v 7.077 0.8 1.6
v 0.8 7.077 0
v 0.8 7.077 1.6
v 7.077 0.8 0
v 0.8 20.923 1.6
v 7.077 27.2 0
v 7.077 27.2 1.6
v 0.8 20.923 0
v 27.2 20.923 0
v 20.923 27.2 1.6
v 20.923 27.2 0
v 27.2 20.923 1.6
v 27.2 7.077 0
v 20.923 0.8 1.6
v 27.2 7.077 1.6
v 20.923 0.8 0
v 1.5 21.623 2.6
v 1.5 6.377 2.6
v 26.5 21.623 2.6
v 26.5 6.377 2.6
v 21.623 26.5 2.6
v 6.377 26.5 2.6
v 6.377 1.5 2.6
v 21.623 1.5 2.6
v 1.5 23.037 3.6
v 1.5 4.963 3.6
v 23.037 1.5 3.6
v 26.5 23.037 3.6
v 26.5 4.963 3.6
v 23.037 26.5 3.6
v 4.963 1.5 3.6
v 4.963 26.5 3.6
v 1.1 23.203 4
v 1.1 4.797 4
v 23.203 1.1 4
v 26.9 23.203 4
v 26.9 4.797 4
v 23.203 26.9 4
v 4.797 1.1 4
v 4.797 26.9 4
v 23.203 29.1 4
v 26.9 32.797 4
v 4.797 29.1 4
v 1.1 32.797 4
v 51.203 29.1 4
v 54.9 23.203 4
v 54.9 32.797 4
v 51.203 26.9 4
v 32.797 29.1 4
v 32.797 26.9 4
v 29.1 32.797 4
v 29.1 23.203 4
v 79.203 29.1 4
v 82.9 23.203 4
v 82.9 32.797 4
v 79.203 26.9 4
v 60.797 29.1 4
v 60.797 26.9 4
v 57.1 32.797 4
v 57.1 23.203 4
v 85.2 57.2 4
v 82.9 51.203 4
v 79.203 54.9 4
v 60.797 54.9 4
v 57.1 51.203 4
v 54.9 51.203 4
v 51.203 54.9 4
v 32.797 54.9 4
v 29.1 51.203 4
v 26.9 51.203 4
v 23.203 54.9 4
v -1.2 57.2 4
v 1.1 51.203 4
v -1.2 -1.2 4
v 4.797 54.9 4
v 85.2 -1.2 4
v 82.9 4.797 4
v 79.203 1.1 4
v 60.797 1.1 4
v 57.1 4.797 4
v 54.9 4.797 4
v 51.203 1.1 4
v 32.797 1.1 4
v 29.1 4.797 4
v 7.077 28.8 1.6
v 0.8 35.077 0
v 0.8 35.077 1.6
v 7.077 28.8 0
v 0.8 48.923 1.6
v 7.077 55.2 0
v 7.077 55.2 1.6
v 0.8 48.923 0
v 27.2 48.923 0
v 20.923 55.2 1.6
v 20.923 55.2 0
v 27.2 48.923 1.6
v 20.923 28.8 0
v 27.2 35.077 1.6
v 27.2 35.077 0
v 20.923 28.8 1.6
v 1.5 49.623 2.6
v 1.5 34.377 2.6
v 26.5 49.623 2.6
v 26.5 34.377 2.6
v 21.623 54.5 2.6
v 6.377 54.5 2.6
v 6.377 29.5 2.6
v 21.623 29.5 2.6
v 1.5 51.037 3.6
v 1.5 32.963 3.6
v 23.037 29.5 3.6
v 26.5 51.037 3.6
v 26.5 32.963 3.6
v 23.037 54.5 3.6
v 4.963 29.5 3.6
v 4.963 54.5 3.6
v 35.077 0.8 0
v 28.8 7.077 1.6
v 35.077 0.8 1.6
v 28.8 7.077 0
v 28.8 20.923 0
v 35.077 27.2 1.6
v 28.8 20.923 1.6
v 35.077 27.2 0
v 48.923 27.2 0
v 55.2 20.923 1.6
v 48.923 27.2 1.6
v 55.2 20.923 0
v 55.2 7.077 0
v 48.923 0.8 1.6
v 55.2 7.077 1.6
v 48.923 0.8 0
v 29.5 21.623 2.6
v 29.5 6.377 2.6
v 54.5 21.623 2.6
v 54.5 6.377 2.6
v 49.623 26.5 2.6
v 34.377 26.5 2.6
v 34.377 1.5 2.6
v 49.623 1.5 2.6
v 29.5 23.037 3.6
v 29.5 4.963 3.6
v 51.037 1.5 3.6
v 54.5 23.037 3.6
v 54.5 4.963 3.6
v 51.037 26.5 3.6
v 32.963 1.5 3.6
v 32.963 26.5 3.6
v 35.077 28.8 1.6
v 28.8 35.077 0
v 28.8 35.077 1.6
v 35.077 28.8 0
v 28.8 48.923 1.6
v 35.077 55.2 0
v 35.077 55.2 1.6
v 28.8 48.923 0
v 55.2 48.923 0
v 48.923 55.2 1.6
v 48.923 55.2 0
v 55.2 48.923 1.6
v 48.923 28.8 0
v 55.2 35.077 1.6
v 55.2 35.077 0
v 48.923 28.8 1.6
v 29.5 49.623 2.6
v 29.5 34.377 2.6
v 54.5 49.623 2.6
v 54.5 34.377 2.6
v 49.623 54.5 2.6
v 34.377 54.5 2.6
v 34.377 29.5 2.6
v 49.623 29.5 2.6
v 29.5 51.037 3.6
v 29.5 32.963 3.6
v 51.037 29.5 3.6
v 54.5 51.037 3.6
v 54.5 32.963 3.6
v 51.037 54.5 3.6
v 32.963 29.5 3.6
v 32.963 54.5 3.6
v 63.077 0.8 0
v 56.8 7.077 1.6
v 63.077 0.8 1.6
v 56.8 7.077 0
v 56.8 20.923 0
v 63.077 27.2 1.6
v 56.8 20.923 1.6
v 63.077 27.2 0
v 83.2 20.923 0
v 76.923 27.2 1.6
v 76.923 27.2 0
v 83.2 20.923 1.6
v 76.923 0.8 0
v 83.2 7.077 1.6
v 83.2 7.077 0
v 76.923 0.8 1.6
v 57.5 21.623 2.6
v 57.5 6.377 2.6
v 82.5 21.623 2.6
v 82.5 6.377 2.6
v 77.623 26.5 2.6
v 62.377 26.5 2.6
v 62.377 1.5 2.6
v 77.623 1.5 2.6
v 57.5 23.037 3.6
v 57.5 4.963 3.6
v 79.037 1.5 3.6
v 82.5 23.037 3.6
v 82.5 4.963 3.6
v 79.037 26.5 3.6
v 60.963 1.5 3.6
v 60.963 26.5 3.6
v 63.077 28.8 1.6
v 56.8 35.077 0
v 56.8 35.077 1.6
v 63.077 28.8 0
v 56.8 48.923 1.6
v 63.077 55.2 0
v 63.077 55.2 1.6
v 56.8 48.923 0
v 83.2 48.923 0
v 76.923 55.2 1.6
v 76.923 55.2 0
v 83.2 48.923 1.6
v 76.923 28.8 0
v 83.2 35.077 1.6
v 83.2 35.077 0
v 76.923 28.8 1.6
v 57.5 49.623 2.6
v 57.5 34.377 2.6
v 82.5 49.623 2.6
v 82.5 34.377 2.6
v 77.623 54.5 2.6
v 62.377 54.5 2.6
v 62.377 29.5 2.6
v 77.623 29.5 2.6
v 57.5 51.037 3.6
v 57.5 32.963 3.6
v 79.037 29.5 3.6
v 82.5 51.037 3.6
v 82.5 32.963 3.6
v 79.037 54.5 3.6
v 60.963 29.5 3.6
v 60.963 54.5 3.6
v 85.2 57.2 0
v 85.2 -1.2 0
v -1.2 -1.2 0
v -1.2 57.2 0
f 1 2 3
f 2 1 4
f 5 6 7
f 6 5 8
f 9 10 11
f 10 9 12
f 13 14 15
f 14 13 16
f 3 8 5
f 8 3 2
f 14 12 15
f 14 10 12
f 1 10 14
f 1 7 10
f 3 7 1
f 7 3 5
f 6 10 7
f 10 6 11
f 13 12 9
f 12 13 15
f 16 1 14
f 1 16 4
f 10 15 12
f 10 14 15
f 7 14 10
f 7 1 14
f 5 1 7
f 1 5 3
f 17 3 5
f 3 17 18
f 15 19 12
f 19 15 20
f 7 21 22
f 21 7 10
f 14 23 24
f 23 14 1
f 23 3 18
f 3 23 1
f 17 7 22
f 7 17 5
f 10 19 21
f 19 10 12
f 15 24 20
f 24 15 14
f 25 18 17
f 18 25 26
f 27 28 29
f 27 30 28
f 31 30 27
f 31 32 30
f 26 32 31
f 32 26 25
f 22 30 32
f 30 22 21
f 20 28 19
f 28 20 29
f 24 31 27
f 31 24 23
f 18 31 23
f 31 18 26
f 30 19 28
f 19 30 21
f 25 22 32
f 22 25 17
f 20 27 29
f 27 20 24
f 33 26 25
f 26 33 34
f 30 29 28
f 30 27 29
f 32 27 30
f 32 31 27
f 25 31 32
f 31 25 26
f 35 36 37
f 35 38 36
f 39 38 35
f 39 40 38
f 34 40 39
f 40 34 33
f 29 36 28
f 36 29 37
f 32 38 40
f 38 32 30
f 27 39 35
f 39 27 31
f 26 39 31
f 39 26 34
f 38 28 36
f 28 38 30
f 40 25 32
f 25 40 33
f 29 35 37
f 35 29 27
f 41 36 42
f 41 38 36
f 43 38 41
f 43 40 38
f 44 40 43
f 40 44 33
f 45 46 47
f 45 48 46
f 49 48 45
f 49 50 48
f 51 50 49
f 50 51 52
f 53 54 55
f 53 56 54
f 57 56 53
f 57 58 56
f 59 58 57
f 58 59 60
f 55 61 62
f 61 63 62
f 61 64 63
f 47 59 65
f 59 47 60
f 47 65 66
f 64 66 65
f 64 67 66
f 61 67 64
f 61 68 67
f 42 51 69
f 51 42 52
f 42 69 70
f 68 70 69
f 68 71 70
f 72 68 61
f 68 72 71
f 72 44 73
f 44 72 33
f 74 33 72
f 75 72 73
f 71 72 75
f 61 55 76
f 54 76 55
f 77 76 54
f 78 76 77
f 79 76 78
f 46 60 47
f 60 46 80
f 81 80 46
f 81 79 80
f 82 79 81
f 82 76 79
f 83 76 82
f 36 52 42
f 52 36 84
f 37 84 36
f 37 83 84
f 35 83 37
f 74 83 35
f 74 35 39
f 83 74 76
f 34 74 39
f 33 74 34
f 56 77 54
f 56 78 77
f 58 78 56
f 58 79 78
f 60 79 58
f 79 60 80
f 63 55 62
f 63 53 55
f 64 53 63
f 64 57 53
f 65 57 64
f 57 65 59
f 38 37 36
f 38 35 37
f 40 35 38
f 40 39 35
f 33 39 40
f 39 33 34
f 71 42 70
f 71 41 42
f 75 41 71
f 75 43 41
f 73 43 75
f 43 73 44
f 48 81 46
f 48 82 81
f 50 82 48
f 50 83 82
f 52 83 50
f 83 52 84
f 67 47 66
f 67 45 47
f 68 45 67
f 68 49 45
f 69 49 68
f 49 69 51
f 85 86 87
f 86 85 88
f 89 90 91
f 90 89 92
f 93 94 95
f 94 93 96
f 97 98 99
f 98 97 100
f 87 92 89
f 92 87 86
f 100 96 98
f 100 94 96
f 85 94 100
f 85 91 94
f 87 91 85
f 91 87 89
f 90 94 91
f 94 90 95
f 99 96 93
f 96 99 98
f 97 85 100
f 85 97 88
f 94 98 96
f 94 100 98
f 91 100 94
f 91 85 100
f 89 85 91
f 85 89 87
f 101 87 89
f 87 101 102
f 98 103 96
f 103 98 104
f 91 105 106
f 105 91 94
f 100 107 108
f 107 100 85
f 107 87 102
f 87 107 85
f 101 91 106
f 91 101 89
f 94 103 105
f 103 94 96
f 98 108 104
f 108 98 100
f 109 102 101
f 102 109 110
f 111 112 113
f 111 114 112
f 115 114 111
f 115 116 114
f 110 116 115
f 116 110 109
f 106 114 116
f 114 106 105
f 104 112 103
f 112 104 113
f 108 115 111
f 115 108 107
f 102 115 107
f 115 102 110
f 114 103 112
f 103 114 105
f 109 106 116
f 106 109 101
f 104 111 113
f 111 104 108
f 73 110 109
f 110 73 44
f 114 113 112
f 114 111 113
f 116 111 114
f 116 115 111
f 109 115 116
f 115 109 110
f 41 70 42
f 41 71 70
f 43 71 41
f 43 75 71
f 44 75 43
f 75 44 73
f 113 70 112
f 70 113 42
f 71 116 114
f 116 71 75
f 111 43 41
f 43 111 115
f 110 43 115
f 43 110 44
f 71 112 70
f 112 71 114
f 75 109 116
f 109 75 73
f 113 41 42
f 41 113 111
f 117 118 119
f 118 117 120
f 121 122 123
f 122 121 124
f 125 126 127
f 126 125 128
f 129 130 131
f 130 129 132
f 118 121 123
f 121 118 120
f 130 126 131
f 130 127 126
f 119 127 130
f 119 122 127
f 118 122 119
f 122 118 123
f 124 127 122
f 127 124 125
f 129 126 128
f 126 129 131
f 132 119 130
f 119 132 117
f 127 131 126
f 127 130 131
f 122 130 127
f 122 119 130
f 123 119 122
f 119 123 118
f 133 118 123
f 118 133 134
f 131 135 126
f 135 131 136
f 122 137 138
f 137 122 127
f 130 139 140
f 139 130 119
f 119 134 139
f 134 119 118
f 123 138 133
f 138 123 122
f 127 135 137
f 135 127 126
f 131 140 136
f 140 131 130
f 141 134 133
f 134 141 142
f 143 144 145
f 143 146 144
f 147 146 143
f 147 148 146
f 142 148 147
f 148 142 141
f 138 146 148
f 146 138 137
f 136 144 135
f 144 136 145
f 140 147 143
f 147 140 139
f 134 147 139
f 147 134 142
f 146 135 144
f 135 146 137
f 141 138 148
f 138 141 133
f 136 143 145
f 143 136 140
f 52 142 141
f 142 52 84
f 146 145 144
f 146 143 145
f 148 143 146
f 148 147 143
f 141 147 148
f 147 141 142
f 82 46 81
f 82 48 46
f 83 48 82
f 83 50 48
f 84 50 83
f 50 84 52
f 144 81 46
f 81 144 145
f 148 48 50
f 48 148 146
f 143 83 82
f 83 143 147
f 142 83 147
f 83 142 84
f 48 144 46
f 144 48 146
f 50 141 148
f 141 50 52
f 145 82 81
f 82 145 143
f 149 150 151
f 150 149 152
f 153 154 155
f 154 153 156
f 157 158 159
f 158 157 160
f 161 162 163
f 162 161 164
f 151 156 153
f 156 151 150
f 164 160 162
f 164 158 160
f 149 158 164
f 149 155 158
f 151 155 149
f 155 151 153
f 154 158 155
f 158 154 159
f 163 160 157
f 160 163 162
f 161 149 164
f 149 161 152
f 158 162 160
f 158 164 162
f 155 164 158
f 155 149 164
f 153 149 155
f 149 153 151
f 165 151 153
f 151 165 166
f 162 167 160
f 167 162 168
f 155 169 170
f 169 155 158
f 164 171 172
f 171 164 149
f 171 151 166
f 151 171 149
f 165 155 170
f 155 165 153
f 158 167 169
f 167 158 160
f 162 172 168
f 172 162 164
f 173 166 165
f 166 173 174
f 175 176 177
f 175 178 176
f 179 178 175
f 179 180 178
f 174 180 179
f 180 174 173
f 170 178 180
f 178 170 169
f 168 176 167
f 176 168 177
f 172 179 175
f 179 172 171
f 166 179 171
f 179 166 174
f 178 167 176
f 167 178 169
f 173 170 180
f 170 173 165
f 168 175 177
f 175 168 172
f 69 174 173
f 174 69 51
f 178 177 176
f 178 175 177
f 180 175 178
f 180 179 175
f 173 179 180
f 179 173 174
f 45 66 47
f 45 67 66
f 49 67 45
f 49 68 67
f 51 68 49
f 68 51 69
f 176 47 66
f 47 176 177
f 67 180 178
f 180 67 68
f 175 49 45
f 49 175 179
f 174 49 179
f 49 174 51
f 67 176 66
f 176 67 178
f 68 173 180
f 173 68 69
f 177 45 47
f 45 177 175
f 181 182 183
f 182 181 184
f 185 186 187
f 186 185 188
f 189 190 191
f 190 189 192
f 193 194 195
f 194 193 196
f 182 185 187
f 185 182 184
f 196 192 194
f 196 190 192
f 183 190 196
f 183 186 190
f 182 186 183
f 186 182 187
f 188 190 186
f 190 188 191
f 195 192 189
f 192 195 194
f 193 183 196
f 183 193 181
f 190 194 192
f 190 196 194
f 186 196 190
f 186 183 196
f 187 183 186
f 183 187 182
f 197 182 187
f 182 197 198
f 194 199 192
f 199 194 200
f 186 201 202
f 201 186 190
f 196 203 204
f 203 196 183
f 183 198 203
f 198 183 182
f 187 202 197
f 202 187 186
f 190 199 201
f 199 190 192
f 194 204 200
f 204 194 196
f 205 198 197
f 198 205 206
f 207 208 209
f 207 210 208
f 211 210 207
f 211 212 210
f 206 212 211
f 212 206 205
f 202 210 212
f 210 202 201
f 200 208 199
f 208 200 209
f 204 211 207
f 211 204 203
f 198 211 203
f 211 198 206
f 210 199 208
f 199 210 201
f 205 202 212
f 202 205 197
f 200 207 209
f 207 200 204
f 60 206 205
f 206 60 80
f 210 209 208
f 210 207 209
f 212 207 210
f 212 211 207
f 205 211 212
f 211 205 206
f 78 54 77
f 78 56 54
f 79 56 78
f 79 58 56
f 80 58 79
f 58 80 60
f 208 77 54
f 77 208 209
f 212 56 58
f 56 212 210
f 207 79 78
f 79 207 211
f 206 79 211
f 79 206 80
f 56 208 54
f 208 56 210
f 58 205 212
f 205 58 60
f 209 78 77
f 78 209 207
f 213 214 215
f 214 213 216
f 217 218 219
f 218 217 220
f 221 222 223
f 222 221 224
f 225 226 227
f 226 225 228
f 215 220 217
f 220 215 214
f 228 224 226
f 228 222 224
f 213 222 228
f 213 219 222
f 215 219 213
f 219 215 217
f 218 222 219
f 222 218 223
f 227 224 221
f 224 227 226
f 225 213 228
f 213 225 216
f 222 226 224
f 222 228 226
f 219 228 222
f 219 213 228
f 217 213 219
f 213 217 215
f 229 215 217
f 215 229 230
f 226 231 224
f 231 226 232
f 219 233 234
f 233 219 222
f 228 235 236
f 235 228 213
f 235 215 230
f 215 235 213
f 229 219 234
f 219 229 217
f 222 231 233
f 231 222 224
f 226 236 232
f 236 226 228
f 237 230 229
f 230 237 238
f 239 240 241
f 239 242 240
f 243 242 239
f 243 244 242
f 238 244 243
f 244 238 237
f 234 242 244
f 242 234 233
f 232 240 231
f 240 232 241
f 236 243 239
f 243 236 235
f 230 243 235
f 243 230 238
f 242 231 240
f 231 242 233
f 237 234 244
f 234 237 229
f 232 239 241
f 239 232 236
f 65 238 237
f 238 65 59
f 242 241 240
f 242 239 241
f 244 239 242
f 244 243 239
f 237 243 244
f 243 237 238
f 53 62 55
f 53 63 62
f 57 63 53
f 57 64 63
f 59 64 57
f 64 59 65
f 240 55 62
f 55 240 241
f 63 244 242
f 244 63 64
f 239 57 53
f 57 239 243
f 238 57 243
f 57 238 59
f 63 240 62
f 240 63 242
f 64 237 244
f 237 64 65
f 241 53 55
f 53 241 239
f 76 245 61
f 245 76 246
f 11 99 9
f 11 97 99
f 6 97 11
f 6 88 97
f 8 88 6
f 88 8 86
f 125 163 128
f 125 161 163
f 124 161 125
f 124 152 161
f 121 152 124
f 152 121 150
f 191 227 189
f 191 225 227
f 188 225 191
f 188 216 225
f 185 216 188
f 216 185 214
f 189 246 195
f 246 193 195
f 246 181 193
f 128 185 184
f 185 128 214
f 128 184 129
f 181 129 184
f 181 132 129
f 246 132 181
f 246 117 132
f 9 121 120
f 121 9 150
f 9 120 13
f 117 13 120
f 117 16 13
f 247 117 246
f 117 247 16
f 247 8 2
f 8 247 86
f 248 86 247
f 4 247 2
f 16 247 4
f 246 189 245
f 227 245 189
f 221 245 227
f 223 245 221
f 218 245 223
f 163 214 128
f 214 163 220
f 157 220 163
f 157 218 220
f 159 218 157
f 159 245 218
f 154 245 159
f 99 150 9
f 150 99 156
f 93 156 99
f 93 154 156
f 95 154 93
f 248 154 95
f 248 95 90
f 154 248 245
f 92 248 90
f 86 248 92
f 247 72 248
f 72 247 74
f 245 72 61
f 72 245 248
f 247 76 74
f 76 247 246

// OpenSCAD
// Standalone openGrid-compatible N x M board; all dimensions in mm.
// Print flat as shown, Z=0 on the bed, snap-entry face upward, no supports.
// Full = 6.8 mm, Lite = 4 mm (upper 4 mm of the Full seat), on a 28 mm grid.
// Use matching Full/Lite mounting snaps to screw this board to the wall.
// There are no direct screw holes or edge-joining sockets. The strengthened
// rim adds `rim` (1.2 mm) per side: overall 28*N + 2*rim by 28*M + 2*rim mm.
// Do not butt these rims together and expect an uninterrupted 28 mm grid.
// Original implementation from dimensional data; no generator code or meshes
// incorporated. openGrid design: David D, https://www.opengrid.world/guides/
// Design and this model: CC BY 4.0, https://creativecommons.org/licenses/by/4.0/
// Dimensional source: BlackjackDuck / Andy Levesque's published openGrid model:
// https://github.com/AndyLevesque/QuackWorks/blob/main/openGrid/openGrid.scad
// That generator's CODE is CC BY-NC-SA; it has not been copied here.
// Changes from the core board: solid stronger perimeter, no connector sockets,
// cosmetic corner cuts or direct screw holes. Physical snap fit needs a trial.

// Number of snap columns on the 28 mm grid (count).
columns = 3; // [1:1:6]
// Number of snap rows on the 28 mm grid (count).
rows = 2; // [1:1:6]
// Board and snap family; Lite is not a scaled Full board.
board_type = "Lite"; // [Lite, Full]
// Solid strengthened rim added around the grid on each side.
rim = 1.2; // mm [1.2:0.2:4]

/* [Hidden] */
pitch = 28;
thickness = board_type == "Full" ? 6.8 : 4;
cut_bottom = 6.8 - thickness;
eps = 0.01;
// Height stations in the Full board; opening widths across opposite flats.
seat_z = [0, 0.4, 1.4, 2.4, 4.4, 5.4, 6.4, 6.8];
seat_width = [25.8, 25, 25, 26.4, 26.4, 25, 25, 25.8];
// Corner material extends 2.6 mm beyond a 4.2 mm diagonal intersection.
corner_inset = 2.6 + 4.2 / sqrt(2);

function diagonal_width(z) =
    pitch * sqrt(2) - 2 * (corner_inset - max(0, 1.4 - min(z, 6.8 - z)));

// A tapered square clipped by another at 45 degrees makes the octagonal seat.
// The two widths vary independently, preserving both the snap ledge and corners.
module opening_segment(z0, z1, w0, w1, d0, d1) {
    translate([0, 0, z0 - cut_bottom])
        intersection() {
            linear_extrude(height = z1 - z0, scale = w1 / w0)
                square([w0, w0], center = true);
            rotate([0, 0, 45])
                linear_extrude(height = z1 - z0, scale = d1 / d0)
                    square([d0, d0], center = true);
        }
}

module snap_opening() {
    // End caps extend the cutter beyond the slab, avoiding coplanar end faces.
    translate([0, 0, -cut_bottom - eps])
        linear_extrude(height = eps)
            intersection() {
                square([seat_width[0], seat_width[0]], center = true);
                rotate(45) square([diagonal_width(0), diagonal_width(0)], center = true);
            }
    for (i = [0:len(seat_z) - 2])
        opening_segment(seat_z[i], seat_z[i + 1], seat_width[i], seat_width[i + 1],
                        diagonal_width(seat_z[i]), diagonal_width(seat_z[i + 1]));
    translate([0, 0, thickness])
        linear_extrude(height = eps)
            intersection() {
                square([seat_width[7], seat_width[7]], center = true);
                rotate(45) square([diagonal_width(6.8), diagonal_width(6.8)], center = true);
            }
}

color("#5ccfc0") difference() {
    translate([-rim, -rim, 0])
        cube([columns * pitch + 2 * rim, rows * pitch + 2 * rim, thickness]);
    for (x = [0:columns - 1])
        for (y = [0:rows - 1])
            translate([(x + 0.5) * pitch, (y + 0.5) * pitch, 0]) snap_opening();
}
